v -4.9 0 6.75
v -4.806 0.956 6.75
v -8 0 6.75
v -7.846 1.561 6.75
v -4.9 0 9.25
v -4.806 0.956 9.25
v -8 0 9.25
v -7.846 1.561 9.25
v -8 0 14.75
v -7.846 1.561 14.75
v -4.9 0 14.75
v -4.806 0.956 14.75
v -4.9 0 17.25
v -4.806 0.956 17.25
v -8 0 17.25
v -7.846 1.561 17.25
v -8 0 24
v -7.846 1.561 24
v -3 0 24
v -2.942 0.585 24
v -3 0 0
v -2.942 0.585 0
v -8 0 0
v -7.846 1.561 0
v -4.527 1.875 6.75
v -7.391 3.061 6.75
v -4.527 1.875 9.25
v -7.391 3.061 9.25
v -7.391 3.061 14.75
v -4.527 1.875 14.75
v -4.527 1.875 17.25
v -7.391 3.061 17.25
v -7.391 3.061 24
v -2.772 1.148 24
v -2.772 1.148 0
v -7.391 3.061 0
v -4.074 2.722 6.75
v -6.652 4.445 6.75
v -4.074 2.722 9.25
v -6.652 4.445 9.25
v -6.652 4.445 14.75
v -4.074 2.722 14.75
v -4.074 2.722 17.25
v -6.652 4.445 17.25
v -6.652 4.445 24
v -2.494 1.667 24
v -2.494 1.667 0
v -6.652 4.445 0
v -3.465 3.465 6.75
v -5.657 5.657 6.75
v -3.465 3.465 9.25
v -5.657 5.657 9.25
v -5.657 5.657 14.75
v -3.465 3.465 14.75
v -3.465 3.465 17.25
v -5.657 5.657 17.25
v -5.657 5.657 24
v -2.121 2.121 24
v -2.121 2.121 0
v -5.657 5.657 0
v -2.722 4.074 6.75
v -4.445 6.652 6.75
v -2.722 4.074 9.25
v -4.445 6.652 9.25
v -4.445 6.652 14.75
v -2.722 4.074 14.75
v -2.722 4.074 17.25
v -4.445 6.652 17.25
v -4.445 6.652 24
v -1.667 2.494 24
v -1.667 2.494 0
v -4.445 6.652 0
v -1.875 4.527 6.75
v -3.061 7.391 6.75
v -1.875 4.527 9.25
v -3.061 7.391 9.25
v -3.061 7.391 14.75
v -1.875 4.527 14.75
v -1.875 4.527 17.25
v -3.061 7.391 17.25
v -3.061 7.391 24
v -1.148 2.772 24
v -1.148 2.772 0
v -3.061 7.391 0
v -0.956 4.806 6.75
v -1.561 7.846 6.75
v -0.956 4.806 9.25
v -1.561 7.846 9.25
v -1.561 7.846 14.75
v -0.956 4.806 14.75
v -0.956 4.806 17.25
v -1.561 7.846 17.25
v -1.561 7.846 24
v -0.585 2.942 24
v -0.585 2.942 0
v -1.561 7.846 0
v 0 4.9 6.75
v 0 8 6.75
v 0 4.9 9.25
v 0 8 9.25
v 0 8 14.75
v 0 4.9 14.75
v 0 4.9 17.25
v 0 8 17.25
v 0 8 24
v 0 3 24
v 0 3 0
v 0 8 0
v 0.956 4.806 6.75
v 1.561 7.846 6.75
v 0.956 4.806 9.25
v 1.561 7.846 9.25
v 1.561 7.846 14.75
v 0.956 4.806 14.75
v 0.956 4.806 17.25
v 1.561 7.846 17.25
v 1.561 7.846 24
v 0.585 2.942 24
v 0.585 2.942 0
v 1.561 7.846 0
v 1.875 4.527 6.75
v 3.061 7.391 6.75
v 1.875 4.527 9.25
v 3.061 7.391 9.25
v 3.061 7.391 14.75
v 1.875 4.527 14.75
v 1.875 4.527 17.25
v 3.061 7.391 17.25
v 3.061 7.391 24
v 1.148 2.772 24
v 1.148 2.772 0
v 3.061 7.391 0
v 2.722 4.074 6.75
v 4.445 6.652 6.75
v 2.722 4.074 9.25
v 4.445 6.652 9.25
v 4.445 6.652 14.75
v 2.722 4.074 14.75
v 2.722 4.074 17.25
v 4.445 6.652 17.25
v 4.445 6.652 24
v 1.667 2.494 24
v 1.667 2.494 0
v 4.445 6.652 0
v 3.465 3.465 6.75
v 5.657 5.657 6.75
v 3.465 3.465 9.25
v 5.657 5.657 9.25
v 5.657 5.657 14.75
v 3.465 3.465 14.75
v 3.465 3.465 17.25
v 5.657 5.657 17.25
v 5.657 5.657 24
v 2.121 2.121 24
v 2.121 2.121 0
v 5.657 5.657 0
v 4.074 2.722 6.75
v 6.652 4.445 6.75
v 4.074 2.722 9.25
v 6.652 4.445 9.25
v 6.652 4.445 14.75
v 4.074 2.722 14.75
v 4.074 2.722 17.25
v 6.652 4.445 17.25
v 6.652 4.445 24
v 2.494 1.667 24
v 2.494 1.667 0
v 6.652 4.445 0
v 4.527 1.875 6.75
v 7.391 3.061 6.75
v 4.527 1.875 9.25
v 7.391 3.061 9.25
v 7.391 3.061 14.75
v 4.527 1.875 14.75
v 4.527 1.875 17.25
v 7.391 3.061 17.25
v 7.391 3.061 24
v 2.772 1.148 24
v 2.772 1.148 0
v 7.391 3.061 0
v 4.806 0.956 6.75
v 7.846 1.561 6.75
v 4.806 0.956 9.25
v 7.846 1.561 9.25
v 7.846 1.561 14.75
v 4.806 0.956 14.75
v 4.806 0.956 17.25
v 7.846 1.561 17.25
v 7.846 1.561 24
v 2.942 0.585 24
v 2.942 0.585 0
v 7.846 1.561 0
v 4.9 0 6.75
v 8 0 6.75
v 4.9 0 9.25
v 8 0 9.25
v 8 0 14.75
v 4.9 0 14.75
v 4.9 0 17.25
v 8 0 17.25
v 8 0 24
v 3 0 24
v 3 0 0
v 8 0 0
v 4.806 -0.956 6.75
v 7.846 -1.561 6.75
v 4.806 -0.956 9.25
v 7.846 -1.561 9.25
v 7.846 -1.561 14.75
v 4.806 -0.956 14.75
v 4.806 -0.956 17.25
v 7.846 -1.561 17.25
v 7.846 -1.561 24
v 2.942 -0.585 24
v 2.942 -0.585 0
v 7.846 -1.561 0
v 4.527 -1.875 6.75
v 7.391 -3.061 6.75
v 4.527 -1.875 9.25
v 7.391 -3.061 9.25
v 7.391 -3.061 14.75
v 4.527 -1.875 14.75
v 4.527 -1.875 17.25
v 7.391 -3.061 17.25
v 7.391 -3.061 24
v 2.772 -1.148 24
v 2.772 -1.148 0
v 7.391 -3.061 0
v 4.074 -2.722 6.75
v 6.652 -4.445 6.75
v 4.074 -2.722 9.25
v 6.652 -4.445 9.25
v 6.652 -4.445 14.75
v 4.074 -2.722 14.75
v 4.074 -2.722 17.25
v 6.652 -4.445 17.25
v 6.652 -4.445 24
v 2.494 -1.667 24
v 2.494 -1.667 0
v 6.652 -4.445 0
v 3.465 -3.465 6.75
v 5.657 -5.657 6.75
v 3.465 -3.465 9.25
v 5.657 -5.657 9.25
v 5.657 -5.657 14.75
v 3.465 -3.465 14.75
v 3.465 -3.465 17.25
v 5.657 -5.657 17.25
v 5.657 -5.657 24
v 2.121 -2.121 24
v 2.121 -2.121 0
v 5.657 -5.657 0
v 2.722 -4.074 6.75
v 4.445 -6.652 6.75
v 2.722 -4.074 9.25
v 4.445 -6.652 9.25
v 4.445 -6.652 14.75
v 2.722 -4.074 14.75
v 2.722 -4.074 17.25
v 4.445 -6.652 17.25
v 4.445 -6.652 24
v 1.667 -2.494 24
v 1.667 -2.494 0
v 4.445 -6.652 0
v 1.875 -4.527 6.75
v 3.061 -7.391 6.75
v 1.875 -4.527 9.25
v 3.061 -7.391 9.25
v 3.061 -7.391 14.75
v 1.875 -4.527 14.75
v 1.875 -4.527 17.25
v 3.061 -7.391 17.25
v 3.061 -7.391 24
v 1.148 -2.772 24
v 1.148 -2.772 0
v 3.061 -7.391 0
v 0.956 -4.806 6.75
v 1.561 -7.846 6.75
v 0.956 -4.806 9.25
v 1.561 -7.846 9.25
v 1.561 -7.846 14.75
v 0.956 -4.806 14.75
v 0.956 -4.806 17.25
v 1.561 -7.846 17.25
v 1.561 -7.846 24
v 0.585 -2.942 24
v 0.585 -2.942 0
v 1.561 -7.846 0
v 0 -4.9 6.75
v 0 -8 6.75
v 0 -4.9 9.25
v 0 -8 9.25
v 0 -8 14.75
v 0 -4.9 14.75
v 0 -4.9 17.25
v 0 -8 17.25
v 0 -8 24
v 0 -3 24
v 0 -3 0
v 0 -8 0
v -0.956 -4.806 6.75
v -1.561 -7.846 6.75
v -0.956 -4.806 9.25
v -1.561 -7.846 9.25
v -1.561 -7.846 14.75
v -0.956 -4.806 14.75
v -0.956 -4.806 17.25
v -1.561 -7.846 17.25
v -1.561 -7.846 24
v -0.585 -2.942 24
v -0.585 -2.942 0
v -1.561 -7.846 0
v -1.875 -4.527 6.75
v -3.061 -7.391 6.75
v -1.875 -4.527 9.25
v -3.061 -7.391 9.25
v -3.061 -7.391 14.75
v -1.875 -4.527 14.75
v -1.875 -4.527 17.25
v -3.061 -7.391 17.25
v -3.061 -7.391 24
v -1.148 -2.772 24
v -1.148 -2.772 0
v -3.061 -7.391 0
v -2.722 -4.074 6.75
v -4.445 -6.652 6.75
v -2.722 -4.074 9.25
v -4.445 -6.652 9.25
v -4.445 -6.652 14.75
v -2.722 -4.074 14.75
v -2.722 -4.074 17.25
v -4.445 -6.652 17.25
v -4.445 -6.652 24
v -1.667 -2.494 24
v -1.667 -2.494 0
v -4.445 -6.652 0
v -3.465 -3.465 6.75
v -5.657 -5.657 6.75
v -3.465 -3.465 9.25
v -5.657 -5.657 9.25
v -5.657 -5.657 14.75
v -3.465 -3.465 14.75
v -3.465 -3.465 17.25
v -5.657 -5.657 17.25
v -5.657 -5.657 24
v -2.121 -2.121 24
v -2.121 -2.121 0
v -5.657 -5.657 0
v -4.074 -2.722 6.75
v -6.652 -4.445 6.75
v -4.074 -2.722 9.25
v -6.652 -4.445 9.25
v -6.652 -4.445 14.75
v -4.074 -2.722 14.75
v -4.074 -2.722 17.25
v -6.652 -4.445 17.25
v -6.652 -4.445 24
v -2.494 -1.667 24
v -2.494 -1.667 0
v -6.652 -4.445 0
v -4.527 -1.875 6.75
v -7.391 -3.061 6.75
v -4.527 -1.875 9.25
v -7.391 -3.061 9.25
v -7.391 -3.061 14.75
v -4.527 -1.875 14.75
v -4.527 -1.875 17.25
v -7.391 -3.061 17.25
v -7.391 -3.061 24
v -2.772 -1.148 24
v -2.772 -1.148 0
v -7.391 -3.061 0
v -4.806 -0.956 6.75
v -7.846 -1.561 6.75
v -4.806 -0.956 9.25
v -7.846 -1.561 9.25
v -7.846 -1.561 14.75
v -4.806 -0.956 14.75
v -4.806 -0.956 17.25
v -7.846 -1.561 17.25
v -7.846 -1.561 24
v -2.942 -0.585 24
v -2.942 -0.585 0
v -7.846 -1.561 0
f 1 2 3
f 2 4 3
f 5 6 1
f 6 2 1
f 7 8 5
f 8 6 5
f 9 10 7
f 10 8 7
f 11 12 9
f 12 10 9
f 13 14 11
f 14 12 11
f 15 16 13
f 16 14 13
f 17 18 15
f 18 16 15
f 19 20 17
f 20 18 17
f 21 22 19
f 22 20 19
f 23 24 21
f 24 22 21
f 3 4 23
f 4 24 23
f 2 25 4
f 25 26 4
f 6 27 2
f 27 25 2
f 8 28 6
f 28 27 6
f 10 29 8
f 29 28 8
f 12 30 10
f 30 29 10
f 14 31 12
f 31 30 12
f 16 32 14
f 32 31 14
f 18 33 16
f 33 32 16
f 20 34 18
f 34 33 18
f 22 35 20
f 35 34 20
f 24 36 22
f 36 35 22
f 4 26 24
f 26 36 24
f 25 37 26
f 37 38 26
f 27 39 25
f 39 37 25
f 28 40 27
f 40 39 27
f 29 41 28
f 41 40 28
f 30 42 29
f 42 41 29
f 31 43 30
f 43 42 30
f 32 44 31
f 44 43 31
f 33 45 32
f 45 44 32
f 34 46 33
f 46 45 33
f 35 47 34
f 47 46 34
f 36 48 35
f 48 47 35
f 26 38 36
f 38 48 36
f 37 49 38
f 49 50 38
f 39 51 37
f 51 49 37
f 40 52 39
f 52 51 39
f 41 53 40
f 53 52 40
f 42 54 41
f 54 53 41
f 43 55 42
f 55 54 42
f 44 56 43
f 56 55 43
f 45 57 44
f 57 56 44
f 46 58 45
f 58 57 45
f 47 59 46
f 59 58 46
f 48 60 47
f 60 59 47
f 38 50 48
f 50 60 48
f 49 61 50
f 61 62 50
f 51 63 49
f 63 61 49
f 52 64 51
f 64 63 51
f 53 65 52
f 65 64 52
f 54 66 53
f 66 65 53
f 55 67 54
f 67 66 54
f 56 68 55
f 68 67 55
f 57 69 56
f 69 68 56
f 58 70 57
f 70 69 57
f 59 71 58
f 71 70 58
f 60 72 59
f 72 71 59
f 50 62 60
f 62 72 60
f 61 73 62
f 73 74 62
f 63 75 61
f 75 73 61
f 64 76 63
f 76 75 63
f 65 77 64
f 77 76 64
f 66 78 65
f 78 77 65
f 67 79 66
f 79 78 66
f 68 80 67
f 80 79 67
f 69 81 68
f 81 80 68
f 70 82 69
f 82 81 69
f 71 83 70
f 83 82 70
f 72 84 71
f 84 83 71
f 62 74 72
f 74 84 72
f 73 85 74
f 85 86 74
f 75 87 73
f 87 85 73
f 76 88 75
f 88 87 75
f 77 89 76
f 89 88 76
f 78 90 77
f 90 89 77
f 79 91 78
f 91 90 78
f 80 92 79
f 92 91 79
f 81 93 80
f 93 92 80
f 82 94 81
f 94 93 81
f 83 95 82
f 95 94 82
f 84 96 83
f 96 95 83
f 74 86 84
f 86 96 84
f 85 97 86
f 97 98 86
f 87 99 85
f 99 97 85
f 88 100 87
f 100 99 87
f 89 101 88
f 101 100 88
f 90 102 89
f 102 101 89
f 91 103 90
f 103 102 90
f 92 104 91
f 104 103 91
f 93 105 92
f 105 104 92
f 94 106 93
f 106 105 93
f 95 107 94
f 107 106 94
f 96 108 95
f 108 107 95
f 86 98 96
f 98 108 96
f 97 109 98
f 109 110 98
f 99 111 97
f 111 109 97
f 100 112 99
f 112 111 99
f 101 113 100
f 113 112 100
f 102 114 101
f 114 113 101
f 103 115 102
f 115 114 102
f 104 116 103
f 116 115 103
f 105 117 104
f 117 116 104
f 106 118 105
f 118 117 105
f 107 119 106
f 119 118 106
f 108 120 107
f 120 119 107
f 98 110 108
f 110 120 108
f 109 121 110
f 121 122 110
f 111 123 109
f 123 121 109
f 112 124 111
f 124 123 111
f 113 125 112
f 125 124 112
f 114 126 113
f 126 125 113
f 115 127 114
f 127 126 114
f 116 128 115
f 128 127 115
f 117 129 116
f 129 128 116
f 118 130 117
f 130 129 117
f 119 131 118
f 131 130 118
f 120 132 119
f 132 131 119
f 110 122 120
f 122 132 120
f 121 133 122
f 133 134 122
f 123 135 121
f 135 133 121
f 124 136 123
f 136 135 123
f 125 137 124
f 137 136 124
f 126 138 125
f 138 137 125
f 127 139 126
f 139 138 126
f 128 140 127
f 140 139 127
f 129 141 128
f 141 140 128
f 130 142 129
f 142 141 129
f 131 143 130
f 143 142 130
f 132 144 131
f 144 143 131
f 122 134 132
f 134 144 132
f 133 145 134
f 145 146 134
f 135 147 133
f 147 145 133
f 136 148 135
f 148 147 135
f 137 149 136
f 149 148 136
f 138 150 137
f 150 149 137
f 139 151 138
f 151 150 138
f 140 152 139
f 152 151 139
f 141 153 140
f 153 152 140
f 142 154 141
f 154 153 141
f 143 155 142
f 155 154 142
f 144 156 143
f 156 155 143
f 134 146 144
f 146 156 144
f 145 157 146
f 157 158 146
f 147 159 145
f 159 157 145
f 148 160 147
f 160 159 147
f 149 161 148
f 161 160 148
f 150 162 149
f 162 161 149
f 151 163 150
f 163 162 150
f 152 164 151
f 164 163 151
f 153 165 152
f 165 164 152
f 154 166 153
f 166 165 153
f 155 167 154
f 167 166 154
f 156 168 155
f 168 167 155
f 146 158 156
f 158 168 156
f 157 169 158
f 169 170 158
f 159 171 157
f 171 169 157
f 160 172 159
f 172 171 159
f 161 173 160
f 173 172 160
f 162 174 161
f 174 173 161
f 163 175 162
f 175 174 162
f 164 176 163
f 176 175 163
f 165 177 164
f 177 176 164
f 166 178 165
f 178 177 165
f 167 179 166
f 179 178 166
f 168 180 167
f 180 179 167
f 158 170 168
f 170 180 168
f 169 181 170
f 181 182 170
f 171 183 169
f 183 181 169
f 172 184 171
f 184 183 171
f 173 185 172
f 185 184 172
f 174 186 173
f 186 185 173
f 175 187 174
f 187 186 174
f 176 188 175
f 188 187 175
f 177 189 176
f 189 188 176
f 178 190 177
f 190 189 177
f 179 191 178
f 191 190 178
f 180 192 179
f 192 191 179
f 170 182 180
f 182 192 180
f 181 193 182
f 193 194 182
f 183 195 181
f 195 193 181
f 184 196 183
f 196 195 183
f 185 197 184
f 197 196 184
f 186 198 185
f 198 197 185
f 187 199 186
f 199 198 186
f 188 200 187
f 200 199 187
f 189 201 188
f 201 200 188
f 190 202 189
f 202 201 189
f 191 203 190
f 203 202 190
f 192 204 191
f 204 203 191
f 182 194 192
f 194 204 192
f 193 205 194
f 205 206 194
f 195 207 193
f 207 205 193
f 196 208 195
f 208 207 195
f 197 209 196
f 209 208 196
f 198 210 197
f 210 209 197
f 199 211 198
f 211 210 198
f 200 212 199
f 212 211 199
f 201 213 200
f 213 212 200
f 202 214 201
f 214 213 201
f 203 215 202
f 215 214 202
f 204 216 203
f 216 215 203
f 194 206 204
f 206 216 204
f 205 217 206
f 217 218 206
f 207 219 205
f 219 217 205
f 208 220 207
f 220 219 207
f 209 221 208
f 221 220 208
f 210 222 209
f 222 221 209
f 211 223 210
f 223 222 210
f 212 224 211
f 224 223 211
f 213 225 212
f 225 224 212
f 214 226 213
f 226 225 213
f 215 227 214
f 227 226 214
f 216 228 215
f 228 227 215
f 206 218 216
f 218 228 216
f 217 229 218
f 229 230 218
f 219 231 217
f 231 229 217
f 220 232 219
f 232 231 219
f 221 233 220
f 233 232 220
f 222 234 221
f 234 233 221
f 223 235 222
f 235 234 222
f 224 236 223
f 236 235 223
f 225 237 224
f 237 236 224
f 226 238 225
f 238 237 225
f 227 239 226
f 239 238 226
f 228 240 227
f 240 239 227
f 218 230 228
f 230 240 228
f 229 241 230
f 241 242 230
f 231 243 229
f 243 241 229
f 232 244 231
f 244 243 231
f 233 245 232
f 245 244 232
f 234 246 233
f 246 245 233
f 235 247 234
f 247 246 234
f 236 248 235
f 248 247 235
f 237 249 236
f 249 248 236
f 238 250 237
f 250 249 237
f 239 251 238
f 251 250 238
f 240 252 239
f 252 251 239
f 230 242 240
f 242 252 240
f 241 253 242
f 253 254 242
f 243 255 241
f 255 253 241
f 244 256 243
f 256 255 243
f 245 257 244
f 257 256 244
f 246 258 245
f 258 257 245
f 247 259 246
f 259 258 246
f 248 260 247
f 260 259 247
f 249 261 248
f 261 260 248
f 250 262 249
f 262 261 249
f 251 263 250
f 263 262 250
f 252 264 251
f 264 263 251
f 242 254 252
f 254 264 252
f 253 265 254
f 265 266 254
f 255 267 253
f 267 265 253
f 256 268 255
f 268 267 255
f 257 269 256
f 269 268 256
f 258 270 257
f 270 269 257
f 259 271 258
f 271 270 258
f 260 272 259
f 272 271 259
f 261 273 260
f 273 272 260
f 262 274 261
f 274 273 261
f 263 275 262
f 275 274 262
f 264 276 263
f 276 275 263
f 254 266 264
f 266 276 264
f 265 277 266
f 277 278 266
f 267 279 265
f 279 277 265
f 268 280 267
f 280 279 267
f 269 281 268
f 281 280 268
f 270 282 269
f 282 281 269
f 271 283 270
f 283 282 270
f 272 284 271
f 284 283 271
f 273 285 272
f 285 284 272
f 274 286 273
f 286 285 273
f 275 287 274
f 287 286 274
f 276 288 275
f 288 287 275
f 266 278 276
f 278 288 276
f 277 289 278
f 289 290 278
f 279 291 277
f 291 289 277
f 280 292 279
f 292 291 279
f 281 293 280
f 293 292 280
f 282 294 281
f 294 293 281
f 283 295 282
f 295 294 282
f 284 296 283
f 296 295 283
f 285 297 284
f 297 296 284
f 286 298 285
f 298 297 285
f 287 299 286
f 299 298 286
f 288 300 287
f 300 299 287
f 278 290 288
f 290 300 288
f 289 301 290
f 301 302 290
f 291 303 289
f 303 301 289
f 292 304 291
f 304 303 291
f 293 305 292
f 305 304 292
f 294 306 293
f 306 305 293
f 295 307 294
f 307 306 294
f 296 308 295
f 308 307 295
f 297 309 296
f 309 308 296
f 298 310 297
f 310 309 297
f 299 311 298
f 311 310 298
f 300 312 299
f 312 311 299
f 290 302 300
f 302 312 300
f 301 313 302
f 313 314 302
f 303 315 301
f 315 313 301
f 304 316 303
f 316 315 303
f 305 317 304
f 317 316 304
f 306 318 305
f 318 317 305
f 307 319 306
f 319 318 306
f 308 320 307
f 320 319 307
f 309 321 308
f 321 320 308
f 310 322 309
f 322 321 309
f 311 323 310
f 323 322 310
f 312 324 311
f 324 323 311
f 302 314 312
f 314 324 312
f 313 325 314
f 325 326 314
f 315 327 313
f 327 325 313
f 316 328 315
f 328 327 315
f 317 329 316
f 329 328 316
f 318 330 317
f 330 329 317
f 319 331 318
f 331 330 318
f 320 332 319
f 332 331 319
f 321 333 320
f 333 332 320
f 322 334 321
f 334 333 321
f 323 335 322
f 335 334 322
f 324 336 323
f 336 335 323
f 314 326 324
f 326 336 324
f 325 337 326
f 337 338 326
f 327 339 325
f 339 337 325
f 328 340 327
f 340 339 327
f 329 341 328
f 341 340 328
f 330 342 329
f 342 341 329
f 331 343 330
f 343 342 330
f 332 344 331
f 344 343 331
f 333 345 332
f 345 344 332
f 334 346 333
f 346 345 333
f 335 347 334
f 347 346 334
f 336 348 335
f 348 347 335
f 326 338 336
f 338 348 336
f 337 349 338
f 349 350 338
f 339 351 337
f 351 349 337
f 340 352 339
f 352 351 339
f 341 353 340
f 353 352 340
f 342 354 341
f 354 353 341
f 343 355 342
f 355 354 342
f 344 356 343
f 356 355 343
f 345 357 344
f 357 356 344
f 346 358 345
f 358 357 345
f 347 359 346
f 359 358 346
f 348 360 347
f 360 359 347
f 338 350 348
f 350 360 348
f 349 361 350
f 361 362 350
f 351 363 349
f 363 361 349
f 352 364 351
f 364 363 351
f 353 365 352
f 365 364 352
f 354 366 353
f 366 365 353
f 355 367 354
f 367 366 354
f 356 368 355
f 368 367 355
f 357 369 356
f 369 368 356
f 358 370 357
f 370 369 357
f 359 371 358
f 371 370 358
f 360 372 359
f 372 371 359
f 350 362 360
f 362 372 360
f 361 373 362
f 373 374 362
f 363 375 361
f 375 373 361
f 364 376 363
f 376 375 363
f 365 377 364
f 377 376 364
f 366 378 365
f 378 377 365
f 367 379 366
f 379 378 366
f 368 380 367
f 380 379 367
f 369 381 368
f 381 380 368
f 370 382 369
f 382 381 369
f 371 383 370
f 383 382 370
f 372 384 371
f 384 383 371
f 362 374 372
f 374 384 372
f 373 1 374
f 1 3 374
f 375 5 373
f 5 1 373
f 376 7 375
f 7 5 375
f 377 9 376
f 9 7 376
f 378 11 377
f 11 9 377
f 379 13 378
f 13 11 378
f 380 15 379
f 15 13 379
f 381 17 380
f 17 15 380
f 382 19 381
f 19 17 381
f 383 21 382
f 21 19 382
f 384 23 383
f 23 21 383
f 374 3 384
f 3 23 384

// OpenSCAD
$fn = 32;

// ----------------------------------------------------------------------
// Grooved revolve: plain_grooves, bore R3
// ----------------------------------------------------------------------

// --- parameters (mm) ---
bore_r = 3;               // bore radius
outer_r = 8;              // outer radius of the body
total_h = 24;             // overall height, Z
wall = 5;                 // radial wall thickness
groove_w = 2.5;           // groove width
groove_d = 3.1;           // groove depth
grooves = 2;              // number of outer grooves

bbox_x = 2 * outer_r;  // full diameter
bore_d = 2 * bore_r;  // bore diameter
body_d = 2 * outer_r;  // body diameter
revolve_angle = 360;  // full turn around the Z axis

profile = [[3, 0], [8, 0], [8, 6.75], [4.9, 6.75], [4.9, 9.25], [8, 9.25], [8, 14.75], [4.9, 14.75], [4.9, 17.25], [8, 17.25], [8, 24], [3, 24]];  // primary outline, 12 points, counter clockwise

// --- the one profile operation ---
rotate_extrude(angle = revolve_angle) polygon(points = profile);
